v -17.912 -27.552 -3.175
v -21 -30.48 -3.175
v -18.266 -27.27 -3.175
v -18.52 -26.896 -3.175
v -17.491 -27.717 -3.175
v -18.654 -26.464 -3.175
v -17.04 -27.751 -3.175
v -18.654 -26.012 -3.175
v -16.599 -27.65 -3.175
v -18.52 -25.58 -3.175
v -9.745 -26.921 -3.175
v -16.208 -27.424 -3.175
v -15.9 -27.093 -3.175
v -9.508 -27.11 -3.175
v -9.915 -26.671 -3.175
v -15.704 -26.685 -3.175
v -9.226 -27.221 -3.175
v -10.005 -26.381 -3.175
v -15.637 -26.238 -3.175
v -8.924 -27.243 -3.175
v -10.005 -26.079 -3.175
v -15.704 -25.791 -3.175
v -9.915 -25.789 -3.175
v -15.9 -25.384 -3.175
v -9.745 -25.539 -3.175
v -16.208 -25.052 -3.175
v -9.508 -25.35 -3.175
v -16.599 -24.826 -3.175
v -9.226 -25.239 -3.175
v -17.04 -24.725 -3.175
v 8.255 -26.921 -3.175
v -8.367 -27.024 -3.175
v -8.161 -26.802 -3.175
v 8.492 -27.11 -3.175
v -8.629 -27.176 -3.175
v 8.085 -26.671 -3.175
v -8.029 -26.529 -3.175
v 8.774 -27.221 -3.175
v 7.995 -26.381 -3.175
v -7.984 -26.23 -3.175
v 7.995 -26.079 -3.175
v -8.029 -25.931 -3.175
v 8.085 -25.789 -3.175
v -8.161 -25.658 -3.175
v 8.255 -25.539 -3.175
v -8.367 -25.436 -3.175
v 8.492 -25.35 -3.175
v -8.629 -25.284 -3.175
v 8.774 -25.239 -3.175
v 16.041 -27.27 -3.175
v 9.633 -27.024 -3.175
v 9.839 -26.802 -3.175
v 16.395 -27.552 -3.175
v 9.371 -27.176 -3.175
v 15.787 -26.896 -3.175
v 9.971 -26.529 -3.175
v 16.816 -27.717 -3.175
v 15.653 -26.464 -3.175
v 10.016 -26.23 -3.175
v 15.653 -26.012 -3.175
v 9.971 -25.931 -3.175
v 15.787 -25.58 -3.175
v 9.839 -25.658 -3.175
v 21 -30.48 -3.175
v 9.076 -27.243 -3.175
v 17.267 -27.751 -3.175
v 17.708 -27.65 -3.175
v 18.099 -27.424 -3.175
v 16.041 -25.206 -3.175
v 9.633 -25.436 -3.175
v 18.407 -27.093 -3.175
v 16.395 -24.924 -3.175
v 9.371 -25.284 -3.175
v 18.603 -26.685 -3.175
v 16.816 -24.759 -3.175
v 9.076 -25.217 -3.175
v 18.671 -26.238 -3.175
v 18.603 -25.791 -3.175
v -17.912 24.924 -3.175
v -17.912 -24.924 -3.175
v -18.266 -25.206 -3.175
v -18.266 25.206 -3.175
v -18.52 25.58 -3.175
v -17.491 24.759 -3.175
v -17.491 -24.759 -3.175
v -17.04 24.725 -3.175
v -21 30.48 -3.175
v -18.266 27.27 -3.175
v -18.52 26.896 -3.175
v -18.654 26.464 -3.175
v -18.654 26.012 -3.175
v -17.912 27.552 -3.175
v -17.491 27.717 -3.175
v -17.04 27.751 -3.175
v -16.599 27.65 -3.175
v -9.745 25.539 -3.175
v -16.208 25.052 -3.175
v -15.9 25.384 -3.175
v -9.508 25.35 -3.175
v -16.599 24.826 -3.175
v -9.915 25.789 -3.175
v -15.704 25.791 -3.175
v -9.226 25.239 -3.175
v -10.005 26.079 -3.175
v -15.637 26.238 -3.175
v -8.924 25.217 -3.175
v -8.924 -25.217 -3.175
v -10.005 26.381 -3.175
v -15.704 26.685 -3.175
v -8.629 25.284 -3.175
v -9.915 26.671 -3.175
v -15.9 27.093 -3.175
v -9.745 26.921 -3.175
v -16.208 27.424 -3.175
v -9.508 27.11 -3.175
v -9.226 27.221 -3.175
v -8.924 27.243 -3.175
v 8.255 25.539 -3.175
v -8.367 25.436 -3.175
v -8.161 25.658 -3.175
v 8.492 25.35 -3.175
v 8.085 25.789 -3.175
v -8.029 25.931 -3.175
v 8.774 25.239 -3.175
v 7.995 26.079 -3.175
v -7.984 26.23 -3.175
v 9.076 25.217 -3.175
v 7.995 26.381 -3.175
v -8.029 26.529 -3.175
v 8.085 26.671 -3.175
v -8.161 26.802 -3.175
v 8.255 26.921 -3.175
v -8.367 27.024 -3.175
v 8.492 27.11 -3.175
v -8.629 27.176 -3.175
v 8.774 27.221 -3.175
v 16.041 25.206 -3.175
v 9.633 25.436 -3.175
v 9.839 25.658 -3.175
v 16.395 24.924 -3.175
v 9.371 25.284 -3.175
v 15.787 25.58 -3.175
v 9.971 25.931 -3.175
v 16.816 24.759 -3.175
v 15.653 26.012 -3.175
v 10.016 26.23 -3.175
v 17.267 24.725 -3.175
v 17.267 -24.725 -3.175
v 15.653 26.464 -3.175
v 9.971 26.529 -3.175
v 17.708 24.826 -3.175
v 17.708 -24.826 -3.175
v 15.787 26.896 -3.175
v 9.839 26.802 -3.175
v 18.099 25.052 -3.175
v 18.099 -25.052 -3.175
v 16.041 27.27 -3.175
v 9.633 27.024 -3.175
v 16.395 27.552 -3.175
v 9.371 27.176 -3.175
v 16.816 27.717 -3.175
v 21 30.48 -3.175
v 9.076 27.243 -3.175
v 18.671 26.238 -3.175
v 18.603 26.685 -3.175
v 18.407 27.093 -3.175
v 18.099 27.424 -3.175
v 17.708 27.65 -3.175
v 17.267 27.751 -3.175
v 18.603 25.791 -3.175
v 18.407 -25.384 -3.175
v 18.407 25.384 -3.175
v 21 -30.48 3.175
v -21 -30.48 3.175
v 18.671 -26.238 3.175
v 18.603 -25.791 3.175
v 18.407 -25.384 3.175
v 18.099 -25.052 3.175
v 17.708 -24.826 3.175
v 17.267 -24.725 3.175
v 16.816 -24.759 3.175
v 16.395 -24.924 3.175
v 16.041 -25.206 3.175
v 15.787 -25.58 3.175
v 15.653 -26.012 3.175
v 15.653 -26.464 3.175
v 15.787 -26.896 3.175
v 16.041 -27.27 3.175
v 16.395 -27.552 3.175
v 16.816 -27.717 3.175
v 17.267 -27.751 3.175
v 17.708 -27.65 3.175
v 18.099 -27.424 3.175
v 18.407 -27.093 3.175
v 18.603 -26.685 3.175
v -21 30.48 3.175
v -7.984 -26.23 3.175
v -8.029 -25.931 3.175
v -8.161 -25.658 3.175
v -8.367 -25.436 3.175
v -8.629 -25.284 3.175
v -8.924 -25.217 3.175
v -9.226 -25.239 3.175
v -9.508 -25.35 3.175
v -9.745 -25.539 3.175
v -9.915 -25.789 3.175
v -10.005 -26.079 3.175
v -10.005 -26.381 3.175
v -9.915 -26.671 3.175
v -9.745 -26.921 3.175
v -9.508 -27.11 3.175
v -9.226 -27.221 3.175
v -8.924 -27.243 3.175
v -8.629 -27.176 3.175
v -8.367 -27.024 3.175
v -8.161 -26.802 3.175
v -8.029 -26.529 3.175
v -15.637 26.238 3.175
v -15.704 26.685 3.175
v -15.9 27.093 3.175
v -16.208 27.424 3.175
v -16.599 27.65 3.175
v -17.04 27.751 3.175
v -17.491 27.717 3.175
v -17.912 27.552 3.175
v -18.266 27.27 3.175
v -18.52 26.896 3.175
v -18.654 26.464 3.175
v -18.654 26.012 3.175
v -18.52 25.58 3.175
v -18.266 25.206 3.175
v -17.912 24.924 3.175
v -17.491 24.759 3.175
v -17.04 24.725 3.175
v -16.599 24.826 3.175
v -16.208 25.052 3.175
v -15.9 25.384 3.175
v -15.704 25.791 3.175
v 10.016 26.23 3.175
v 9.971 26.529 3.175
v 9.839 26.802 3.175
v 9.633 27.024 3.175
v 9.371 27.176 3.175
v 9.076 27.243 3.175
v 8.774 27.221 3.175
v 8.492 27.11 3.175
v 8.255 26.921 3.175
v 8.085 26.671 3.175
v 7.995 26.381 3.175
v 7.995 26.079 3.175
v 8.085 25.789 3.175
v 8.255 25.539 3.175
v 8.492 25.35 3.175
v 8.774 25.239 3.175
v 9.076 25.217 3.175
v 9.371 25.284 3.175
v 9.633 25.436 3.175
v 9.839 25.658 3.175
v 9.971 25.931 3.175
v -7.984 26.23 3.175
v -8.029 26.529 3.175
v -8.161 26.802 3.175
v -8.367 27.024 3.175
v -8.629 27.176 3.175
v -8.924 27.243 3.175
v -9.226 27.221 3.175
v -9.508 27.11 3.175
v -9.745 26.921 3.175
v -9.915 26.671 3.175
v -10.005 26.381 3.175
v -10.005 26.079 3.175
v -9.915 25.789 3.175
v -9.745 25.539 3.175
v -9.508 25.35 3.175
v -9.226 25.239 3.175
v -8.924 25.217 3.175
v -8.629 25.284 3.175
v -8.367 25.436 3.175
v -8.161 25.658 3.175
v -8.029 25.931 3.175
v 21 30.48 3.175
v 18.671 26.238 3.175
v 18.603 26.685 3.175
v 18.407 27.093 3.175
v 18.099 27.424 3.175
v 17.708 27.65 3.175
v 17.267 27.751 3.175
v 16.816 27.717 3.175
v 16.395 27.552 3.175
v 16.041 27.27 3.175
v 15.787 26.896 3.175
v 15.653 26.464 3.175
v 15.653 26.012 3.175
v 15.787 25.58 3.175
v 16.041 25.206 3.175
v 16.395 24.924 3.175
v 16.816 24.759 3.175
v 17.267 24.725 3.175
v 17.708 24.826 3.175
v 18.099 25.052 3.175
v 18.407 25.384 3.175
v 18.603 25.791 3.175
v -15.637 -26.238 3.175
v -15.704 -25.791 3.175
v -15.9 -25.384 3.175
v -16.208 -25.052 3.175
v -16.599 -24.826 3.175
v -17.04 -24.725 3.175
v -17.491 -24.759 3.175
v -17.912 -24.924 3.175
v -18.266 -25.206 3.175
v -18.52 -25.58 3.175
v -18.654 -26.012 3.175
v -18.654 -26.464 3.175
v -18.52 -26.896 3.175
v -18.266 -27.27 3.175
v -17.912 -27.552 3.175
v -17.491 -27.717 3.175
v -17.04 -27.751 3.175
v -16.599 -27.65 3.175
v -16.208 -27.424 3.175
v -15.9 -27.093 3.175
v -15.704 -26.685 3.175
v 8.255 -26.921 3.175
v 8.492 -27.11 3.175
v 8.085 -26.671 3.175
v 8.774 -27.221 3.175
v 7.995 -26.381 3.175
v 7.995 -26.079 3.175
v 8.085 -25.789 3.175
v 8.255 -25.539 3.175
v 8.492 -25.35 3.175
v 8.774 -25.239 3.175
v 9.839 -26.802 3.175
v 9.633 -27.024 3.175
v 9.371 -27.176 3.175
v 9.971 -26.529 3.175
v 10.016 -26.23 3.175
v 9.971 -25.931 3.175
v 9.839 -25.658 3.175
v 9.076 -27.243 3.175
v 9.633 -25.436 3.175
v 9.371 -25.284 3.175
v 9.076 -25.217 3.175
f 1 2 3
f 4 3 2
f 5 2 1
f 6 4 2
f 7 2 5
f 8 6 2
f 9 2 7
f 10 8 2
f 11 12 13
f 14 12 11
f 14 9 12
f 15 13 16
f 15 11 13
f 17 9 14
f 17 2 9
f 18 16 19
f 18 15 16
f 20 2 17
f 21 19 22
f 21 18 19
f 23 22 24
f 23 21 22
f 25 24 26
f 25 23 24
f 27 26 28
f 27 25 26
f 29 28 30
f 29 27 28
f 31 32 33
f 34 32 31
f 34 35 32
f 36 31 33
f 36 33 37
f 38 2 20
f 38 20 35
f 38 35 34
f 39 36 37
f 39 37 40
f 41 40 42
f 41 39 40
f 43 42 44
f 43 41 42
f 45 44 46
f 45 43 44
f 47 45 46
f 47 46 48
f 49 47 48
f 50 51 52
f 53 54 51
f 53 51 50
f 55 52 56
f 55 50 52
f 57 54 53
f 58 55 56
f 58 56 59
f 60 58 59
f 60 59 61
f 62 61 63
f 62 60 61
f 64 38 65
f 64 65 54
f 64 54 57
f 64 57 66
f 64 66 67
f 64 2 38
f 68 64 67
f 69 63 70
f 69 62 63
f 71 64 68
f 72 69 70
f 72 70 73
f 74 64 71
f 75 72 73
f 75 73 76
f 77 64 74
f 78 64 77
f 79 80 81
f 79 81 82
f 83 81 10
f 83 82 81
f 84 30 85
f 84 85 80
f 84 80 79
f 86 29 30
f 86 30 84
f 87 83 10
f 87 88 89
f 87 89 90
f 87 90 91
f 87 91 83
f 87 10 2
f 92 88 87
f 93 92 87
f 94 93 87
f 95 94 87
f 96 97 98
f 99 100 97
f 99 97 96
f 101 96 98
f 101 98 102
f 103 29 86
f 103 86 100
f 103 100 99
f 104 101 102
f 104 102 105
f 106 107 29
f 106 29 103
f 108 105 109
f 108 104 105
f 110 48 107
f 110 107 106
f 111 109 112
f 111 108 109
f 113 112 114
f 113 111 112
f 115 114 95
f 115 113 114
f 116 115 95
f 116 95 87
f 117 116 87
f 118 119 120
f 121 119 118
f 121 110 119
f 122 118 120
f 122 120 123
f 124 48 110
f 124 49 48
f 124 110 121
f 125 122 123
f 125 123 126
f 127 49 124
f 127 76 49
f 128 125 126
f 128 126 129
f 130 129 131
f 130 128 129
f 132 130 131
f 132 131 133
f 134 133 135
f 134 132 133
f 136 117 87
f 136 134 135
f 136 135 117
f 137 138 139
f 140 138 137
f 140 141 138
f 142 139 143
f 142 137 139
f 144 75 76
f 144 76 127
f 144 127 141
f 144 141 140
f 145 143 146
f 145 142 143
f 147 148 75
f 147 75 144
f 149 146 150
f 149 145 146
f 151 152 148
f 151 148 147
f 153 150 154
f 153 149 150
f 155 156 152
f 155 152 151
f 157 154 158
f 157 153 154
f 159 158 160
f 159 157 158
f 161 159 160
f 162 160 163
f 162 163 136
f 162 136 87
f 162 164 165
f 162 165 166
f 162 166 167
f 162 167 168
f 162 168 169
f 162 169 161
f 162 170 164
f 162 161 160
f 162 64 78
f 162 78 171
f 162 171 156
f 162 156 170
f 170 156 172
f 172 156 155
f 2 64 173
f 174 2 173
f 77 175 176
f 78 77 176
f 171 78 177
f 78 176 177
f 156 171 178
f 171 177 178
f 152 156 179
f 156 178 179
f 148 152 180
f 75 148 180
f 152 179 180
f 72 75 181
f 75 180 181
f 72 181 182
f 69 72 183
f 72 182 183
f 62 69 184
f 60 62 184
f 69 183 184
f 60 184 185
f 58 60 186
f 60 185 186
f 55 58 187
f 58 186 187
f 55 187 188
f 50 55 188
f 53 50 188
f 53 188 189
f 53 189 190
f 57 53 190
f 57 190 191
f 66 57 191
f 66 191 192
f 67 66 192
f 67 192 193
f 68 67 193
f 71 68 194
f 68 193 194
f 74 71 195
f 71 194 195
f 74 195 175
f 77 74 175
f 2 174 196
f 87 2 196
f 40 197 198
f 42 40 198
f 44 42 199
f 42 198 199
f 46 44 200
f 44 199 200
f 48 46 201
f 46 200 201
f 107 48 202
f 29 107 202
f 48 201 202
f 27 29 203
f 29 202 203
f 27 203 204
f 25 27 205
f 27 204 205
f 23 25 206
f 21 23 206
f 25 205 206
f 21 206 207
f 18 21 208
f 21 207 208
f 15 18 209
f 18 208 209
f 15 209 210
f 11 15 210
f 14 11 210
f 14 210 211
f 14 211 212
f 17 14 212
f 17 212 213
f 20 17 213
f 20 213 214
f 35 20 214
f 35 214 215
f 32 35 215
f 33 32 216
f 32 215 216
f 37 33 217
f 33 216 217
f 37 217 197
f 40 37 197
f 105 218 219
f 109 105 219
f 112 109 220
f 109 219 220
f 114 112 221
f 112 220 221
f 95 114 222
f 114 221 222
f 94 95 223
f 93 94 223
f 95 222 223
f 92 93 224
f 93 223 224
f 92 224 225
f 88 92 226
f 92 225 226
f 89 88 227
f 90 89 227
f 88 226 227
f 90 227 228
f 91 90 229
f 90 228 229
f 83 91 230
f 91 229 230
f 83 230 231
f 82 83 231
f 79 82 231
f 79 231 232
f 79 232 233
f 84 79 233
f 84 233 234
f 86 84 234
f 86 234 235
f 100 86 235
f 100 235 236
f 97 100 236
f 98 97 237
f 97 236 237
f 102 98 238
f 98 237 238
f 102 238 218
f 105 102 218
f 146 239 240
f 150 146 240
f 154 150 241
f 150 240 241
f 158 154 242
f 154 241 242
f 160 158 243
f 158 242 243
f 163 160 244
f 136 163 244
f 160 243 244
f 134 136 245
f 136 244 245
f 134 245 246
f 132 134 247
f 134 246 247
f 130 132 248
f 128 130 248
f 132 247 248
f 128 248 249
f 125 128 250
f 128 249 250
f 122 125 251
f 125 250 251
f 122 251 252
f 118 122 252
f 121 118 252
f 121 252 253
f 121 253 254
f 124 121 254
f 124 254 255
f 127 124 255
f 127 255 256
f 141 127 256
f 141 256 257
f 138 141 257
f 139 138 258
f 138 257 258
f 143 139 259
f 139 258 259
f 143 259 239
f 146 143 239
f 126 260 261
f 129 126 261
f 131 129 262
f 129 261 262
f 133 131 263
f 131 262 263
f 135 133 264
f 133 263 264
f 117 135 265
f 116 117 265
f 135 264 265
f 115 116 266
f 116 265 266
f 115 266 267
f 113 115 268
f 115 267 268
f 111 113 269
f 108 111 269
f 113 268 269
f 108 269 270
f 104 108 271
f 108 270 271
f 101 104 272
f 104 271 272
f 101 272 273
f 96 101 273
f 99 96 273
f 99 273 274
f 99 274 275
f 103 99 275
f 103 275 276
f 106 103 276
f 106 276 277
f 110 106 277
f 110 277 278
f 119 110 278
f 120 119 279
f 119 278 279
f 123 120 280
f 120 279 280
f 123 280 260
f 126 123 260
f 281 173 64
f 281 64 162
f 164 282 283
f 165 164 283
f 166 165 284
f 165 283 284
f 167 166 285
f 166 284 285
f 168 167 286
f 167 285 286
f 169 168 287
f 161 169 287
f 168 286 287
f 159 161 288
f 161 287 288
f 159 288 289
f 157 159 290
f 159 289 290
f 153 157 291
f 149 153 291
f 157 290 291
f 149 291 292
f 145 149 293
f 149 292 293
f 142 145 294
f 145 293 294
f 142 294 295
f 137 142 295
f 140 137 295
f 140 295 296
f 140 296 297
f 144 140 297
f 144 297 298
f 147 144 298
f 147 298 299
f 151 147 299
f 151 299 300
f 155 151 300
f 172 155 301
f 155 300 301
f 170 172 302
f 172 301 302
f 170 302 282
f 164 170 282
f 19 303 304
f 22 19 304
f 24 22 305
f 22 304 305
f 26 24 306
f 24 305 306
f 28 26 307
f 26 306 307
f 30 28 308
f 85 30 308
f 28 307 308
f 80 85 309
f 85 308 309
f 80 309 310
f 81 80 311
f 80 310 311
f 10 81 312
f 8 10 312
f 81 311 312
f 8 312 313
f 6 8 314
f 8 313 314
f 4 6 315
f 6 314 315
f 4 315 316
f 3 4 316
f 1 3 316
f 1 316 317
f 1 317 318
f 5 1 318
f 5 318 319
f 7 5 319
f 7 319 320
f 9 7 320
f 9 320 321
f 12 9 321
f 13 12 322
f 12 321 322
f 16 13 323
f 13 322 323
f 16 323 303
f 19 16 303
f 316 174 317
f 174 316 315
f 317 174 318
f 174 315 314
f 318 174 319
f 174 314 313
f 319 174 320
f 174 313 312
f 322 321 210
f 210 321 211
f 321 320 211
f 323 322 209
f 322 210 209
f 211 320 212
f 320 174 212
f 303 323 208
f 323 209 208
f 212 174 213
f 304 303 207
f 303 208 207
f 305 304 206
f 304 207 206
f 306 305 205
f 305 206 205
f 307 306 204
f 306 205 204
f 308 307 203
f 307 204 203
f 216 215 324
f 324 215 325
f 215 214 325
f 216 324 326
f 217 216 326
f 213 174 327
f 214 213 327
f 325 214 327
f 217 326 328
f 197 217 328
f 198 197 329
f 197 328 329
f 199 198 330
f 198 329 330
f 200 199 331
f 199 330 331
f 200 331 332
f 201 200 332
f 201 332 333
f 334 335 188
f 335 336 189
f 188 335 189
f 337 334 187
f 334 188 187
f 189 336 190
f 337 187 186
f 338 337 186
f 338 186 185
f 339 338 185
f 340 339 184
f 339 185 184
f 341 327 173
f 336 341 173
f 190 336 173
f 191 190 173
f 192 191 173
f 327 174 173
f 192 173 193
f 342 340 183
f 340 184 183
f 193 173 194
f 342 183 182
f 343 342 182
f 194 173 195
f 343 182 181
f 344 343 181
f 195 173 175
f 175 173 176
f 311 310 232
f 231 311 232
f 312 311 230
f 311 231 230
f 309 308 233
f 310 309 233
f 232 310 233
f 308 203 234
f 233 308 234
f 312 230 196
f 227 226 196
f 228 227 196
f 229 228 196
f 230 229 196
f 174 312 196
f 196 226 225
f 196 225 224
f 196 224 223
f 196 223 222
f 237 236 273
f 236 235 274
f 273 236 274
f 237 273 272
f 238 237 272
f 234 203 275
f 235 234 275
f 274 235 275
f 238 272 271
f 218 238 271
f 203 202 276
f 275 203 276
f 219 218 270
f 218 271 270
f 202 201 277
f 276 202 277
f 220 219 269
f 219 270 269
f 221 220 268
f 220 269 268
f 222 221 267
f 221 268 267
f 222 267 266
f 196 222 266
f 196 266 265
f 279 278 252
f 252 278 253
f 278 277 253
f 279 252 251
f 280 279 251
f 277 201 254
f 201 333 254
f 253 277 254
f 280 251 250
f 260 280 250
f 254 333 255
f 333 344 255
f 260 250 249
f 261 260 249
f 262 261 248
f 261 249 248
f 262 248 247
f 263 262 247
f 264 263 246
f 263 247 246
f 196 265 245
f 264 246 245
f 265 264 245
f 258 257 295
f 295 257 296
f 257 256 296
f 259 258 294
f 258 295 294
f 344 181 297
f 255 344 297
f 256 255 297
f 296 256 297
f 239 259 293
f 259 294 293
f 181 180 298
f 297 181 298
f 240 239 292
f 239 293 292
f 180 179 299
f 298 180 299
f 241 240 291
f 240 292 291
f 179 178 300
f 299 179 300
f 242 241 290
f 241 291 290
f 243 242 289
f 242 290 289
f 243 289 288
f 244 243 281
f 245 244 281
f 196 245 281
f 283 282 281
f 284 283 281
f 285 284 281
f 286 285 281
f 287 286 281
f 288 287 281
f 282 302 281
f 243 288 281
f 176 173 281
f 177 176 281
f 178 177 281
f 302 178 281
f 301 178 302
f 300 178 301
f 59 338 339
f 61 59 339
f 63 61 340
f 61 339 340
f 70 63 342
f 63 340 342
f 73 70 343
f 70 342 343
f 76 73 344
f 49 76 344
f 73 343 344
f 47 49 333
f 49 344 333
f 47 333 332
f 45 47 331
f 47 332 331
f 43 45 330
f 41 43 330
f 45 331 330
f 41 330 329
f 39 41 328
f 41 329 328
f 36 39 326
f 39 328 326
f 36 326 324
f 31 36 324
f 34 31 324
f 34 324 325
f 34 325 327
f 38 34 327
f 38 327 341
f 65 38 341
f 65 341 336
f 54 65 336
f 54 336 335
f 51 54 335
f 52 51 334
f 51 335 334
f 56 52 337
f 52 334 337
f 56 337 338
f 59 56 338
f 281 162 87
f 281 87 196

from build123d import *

# Parameters (mm, degrees)
F0_W     = 60.96
F0_H     = 6.35
F1_DEPTH = 21
F2_R     = 1.016
F3_R     = 1.516992
F4_DEPTH = 6.35


with BuildPart() as f1:
    # F0 (on Right) → F1 (new body, symmetric)
    with BuildSketch(Plane.YZ):
        Rectangle(F0_W, F0_H)
    extrude(amount=F1_DEPTH, both=True)

    # F2 (on face) + F3 (on face) → F4 (cut, through all)
    with BuildSketch(Plane.XY.offset(3.175)):
        with Locations((-9, -26.23)):
            Circle(F2_R)
        with Locations((9, -26.23)):
            Circle(F2_R)
        with Locations((9, 26.23)):
            Circle(F2_R)
        with Locations((-9, 26.23)):
            Circle(F2_R)
    with BuildSketch(Plane.XY.offset(3.175)):
        with Locations((-17.153514, 26.2382)):
            Circle(F3_R)
        with Locations((17.153514, 26.2382)):
            Circle(F3_R)
        with Locations((17.153514, -26.2382)):
            Circle(F3_R)
        with Locations((-17.153514, -26.2382)):
            Circle(F3_R)
    extrude(amount=-F4_DEPTH, mode=Mode.SUBTRACT)


solid = f1.part
